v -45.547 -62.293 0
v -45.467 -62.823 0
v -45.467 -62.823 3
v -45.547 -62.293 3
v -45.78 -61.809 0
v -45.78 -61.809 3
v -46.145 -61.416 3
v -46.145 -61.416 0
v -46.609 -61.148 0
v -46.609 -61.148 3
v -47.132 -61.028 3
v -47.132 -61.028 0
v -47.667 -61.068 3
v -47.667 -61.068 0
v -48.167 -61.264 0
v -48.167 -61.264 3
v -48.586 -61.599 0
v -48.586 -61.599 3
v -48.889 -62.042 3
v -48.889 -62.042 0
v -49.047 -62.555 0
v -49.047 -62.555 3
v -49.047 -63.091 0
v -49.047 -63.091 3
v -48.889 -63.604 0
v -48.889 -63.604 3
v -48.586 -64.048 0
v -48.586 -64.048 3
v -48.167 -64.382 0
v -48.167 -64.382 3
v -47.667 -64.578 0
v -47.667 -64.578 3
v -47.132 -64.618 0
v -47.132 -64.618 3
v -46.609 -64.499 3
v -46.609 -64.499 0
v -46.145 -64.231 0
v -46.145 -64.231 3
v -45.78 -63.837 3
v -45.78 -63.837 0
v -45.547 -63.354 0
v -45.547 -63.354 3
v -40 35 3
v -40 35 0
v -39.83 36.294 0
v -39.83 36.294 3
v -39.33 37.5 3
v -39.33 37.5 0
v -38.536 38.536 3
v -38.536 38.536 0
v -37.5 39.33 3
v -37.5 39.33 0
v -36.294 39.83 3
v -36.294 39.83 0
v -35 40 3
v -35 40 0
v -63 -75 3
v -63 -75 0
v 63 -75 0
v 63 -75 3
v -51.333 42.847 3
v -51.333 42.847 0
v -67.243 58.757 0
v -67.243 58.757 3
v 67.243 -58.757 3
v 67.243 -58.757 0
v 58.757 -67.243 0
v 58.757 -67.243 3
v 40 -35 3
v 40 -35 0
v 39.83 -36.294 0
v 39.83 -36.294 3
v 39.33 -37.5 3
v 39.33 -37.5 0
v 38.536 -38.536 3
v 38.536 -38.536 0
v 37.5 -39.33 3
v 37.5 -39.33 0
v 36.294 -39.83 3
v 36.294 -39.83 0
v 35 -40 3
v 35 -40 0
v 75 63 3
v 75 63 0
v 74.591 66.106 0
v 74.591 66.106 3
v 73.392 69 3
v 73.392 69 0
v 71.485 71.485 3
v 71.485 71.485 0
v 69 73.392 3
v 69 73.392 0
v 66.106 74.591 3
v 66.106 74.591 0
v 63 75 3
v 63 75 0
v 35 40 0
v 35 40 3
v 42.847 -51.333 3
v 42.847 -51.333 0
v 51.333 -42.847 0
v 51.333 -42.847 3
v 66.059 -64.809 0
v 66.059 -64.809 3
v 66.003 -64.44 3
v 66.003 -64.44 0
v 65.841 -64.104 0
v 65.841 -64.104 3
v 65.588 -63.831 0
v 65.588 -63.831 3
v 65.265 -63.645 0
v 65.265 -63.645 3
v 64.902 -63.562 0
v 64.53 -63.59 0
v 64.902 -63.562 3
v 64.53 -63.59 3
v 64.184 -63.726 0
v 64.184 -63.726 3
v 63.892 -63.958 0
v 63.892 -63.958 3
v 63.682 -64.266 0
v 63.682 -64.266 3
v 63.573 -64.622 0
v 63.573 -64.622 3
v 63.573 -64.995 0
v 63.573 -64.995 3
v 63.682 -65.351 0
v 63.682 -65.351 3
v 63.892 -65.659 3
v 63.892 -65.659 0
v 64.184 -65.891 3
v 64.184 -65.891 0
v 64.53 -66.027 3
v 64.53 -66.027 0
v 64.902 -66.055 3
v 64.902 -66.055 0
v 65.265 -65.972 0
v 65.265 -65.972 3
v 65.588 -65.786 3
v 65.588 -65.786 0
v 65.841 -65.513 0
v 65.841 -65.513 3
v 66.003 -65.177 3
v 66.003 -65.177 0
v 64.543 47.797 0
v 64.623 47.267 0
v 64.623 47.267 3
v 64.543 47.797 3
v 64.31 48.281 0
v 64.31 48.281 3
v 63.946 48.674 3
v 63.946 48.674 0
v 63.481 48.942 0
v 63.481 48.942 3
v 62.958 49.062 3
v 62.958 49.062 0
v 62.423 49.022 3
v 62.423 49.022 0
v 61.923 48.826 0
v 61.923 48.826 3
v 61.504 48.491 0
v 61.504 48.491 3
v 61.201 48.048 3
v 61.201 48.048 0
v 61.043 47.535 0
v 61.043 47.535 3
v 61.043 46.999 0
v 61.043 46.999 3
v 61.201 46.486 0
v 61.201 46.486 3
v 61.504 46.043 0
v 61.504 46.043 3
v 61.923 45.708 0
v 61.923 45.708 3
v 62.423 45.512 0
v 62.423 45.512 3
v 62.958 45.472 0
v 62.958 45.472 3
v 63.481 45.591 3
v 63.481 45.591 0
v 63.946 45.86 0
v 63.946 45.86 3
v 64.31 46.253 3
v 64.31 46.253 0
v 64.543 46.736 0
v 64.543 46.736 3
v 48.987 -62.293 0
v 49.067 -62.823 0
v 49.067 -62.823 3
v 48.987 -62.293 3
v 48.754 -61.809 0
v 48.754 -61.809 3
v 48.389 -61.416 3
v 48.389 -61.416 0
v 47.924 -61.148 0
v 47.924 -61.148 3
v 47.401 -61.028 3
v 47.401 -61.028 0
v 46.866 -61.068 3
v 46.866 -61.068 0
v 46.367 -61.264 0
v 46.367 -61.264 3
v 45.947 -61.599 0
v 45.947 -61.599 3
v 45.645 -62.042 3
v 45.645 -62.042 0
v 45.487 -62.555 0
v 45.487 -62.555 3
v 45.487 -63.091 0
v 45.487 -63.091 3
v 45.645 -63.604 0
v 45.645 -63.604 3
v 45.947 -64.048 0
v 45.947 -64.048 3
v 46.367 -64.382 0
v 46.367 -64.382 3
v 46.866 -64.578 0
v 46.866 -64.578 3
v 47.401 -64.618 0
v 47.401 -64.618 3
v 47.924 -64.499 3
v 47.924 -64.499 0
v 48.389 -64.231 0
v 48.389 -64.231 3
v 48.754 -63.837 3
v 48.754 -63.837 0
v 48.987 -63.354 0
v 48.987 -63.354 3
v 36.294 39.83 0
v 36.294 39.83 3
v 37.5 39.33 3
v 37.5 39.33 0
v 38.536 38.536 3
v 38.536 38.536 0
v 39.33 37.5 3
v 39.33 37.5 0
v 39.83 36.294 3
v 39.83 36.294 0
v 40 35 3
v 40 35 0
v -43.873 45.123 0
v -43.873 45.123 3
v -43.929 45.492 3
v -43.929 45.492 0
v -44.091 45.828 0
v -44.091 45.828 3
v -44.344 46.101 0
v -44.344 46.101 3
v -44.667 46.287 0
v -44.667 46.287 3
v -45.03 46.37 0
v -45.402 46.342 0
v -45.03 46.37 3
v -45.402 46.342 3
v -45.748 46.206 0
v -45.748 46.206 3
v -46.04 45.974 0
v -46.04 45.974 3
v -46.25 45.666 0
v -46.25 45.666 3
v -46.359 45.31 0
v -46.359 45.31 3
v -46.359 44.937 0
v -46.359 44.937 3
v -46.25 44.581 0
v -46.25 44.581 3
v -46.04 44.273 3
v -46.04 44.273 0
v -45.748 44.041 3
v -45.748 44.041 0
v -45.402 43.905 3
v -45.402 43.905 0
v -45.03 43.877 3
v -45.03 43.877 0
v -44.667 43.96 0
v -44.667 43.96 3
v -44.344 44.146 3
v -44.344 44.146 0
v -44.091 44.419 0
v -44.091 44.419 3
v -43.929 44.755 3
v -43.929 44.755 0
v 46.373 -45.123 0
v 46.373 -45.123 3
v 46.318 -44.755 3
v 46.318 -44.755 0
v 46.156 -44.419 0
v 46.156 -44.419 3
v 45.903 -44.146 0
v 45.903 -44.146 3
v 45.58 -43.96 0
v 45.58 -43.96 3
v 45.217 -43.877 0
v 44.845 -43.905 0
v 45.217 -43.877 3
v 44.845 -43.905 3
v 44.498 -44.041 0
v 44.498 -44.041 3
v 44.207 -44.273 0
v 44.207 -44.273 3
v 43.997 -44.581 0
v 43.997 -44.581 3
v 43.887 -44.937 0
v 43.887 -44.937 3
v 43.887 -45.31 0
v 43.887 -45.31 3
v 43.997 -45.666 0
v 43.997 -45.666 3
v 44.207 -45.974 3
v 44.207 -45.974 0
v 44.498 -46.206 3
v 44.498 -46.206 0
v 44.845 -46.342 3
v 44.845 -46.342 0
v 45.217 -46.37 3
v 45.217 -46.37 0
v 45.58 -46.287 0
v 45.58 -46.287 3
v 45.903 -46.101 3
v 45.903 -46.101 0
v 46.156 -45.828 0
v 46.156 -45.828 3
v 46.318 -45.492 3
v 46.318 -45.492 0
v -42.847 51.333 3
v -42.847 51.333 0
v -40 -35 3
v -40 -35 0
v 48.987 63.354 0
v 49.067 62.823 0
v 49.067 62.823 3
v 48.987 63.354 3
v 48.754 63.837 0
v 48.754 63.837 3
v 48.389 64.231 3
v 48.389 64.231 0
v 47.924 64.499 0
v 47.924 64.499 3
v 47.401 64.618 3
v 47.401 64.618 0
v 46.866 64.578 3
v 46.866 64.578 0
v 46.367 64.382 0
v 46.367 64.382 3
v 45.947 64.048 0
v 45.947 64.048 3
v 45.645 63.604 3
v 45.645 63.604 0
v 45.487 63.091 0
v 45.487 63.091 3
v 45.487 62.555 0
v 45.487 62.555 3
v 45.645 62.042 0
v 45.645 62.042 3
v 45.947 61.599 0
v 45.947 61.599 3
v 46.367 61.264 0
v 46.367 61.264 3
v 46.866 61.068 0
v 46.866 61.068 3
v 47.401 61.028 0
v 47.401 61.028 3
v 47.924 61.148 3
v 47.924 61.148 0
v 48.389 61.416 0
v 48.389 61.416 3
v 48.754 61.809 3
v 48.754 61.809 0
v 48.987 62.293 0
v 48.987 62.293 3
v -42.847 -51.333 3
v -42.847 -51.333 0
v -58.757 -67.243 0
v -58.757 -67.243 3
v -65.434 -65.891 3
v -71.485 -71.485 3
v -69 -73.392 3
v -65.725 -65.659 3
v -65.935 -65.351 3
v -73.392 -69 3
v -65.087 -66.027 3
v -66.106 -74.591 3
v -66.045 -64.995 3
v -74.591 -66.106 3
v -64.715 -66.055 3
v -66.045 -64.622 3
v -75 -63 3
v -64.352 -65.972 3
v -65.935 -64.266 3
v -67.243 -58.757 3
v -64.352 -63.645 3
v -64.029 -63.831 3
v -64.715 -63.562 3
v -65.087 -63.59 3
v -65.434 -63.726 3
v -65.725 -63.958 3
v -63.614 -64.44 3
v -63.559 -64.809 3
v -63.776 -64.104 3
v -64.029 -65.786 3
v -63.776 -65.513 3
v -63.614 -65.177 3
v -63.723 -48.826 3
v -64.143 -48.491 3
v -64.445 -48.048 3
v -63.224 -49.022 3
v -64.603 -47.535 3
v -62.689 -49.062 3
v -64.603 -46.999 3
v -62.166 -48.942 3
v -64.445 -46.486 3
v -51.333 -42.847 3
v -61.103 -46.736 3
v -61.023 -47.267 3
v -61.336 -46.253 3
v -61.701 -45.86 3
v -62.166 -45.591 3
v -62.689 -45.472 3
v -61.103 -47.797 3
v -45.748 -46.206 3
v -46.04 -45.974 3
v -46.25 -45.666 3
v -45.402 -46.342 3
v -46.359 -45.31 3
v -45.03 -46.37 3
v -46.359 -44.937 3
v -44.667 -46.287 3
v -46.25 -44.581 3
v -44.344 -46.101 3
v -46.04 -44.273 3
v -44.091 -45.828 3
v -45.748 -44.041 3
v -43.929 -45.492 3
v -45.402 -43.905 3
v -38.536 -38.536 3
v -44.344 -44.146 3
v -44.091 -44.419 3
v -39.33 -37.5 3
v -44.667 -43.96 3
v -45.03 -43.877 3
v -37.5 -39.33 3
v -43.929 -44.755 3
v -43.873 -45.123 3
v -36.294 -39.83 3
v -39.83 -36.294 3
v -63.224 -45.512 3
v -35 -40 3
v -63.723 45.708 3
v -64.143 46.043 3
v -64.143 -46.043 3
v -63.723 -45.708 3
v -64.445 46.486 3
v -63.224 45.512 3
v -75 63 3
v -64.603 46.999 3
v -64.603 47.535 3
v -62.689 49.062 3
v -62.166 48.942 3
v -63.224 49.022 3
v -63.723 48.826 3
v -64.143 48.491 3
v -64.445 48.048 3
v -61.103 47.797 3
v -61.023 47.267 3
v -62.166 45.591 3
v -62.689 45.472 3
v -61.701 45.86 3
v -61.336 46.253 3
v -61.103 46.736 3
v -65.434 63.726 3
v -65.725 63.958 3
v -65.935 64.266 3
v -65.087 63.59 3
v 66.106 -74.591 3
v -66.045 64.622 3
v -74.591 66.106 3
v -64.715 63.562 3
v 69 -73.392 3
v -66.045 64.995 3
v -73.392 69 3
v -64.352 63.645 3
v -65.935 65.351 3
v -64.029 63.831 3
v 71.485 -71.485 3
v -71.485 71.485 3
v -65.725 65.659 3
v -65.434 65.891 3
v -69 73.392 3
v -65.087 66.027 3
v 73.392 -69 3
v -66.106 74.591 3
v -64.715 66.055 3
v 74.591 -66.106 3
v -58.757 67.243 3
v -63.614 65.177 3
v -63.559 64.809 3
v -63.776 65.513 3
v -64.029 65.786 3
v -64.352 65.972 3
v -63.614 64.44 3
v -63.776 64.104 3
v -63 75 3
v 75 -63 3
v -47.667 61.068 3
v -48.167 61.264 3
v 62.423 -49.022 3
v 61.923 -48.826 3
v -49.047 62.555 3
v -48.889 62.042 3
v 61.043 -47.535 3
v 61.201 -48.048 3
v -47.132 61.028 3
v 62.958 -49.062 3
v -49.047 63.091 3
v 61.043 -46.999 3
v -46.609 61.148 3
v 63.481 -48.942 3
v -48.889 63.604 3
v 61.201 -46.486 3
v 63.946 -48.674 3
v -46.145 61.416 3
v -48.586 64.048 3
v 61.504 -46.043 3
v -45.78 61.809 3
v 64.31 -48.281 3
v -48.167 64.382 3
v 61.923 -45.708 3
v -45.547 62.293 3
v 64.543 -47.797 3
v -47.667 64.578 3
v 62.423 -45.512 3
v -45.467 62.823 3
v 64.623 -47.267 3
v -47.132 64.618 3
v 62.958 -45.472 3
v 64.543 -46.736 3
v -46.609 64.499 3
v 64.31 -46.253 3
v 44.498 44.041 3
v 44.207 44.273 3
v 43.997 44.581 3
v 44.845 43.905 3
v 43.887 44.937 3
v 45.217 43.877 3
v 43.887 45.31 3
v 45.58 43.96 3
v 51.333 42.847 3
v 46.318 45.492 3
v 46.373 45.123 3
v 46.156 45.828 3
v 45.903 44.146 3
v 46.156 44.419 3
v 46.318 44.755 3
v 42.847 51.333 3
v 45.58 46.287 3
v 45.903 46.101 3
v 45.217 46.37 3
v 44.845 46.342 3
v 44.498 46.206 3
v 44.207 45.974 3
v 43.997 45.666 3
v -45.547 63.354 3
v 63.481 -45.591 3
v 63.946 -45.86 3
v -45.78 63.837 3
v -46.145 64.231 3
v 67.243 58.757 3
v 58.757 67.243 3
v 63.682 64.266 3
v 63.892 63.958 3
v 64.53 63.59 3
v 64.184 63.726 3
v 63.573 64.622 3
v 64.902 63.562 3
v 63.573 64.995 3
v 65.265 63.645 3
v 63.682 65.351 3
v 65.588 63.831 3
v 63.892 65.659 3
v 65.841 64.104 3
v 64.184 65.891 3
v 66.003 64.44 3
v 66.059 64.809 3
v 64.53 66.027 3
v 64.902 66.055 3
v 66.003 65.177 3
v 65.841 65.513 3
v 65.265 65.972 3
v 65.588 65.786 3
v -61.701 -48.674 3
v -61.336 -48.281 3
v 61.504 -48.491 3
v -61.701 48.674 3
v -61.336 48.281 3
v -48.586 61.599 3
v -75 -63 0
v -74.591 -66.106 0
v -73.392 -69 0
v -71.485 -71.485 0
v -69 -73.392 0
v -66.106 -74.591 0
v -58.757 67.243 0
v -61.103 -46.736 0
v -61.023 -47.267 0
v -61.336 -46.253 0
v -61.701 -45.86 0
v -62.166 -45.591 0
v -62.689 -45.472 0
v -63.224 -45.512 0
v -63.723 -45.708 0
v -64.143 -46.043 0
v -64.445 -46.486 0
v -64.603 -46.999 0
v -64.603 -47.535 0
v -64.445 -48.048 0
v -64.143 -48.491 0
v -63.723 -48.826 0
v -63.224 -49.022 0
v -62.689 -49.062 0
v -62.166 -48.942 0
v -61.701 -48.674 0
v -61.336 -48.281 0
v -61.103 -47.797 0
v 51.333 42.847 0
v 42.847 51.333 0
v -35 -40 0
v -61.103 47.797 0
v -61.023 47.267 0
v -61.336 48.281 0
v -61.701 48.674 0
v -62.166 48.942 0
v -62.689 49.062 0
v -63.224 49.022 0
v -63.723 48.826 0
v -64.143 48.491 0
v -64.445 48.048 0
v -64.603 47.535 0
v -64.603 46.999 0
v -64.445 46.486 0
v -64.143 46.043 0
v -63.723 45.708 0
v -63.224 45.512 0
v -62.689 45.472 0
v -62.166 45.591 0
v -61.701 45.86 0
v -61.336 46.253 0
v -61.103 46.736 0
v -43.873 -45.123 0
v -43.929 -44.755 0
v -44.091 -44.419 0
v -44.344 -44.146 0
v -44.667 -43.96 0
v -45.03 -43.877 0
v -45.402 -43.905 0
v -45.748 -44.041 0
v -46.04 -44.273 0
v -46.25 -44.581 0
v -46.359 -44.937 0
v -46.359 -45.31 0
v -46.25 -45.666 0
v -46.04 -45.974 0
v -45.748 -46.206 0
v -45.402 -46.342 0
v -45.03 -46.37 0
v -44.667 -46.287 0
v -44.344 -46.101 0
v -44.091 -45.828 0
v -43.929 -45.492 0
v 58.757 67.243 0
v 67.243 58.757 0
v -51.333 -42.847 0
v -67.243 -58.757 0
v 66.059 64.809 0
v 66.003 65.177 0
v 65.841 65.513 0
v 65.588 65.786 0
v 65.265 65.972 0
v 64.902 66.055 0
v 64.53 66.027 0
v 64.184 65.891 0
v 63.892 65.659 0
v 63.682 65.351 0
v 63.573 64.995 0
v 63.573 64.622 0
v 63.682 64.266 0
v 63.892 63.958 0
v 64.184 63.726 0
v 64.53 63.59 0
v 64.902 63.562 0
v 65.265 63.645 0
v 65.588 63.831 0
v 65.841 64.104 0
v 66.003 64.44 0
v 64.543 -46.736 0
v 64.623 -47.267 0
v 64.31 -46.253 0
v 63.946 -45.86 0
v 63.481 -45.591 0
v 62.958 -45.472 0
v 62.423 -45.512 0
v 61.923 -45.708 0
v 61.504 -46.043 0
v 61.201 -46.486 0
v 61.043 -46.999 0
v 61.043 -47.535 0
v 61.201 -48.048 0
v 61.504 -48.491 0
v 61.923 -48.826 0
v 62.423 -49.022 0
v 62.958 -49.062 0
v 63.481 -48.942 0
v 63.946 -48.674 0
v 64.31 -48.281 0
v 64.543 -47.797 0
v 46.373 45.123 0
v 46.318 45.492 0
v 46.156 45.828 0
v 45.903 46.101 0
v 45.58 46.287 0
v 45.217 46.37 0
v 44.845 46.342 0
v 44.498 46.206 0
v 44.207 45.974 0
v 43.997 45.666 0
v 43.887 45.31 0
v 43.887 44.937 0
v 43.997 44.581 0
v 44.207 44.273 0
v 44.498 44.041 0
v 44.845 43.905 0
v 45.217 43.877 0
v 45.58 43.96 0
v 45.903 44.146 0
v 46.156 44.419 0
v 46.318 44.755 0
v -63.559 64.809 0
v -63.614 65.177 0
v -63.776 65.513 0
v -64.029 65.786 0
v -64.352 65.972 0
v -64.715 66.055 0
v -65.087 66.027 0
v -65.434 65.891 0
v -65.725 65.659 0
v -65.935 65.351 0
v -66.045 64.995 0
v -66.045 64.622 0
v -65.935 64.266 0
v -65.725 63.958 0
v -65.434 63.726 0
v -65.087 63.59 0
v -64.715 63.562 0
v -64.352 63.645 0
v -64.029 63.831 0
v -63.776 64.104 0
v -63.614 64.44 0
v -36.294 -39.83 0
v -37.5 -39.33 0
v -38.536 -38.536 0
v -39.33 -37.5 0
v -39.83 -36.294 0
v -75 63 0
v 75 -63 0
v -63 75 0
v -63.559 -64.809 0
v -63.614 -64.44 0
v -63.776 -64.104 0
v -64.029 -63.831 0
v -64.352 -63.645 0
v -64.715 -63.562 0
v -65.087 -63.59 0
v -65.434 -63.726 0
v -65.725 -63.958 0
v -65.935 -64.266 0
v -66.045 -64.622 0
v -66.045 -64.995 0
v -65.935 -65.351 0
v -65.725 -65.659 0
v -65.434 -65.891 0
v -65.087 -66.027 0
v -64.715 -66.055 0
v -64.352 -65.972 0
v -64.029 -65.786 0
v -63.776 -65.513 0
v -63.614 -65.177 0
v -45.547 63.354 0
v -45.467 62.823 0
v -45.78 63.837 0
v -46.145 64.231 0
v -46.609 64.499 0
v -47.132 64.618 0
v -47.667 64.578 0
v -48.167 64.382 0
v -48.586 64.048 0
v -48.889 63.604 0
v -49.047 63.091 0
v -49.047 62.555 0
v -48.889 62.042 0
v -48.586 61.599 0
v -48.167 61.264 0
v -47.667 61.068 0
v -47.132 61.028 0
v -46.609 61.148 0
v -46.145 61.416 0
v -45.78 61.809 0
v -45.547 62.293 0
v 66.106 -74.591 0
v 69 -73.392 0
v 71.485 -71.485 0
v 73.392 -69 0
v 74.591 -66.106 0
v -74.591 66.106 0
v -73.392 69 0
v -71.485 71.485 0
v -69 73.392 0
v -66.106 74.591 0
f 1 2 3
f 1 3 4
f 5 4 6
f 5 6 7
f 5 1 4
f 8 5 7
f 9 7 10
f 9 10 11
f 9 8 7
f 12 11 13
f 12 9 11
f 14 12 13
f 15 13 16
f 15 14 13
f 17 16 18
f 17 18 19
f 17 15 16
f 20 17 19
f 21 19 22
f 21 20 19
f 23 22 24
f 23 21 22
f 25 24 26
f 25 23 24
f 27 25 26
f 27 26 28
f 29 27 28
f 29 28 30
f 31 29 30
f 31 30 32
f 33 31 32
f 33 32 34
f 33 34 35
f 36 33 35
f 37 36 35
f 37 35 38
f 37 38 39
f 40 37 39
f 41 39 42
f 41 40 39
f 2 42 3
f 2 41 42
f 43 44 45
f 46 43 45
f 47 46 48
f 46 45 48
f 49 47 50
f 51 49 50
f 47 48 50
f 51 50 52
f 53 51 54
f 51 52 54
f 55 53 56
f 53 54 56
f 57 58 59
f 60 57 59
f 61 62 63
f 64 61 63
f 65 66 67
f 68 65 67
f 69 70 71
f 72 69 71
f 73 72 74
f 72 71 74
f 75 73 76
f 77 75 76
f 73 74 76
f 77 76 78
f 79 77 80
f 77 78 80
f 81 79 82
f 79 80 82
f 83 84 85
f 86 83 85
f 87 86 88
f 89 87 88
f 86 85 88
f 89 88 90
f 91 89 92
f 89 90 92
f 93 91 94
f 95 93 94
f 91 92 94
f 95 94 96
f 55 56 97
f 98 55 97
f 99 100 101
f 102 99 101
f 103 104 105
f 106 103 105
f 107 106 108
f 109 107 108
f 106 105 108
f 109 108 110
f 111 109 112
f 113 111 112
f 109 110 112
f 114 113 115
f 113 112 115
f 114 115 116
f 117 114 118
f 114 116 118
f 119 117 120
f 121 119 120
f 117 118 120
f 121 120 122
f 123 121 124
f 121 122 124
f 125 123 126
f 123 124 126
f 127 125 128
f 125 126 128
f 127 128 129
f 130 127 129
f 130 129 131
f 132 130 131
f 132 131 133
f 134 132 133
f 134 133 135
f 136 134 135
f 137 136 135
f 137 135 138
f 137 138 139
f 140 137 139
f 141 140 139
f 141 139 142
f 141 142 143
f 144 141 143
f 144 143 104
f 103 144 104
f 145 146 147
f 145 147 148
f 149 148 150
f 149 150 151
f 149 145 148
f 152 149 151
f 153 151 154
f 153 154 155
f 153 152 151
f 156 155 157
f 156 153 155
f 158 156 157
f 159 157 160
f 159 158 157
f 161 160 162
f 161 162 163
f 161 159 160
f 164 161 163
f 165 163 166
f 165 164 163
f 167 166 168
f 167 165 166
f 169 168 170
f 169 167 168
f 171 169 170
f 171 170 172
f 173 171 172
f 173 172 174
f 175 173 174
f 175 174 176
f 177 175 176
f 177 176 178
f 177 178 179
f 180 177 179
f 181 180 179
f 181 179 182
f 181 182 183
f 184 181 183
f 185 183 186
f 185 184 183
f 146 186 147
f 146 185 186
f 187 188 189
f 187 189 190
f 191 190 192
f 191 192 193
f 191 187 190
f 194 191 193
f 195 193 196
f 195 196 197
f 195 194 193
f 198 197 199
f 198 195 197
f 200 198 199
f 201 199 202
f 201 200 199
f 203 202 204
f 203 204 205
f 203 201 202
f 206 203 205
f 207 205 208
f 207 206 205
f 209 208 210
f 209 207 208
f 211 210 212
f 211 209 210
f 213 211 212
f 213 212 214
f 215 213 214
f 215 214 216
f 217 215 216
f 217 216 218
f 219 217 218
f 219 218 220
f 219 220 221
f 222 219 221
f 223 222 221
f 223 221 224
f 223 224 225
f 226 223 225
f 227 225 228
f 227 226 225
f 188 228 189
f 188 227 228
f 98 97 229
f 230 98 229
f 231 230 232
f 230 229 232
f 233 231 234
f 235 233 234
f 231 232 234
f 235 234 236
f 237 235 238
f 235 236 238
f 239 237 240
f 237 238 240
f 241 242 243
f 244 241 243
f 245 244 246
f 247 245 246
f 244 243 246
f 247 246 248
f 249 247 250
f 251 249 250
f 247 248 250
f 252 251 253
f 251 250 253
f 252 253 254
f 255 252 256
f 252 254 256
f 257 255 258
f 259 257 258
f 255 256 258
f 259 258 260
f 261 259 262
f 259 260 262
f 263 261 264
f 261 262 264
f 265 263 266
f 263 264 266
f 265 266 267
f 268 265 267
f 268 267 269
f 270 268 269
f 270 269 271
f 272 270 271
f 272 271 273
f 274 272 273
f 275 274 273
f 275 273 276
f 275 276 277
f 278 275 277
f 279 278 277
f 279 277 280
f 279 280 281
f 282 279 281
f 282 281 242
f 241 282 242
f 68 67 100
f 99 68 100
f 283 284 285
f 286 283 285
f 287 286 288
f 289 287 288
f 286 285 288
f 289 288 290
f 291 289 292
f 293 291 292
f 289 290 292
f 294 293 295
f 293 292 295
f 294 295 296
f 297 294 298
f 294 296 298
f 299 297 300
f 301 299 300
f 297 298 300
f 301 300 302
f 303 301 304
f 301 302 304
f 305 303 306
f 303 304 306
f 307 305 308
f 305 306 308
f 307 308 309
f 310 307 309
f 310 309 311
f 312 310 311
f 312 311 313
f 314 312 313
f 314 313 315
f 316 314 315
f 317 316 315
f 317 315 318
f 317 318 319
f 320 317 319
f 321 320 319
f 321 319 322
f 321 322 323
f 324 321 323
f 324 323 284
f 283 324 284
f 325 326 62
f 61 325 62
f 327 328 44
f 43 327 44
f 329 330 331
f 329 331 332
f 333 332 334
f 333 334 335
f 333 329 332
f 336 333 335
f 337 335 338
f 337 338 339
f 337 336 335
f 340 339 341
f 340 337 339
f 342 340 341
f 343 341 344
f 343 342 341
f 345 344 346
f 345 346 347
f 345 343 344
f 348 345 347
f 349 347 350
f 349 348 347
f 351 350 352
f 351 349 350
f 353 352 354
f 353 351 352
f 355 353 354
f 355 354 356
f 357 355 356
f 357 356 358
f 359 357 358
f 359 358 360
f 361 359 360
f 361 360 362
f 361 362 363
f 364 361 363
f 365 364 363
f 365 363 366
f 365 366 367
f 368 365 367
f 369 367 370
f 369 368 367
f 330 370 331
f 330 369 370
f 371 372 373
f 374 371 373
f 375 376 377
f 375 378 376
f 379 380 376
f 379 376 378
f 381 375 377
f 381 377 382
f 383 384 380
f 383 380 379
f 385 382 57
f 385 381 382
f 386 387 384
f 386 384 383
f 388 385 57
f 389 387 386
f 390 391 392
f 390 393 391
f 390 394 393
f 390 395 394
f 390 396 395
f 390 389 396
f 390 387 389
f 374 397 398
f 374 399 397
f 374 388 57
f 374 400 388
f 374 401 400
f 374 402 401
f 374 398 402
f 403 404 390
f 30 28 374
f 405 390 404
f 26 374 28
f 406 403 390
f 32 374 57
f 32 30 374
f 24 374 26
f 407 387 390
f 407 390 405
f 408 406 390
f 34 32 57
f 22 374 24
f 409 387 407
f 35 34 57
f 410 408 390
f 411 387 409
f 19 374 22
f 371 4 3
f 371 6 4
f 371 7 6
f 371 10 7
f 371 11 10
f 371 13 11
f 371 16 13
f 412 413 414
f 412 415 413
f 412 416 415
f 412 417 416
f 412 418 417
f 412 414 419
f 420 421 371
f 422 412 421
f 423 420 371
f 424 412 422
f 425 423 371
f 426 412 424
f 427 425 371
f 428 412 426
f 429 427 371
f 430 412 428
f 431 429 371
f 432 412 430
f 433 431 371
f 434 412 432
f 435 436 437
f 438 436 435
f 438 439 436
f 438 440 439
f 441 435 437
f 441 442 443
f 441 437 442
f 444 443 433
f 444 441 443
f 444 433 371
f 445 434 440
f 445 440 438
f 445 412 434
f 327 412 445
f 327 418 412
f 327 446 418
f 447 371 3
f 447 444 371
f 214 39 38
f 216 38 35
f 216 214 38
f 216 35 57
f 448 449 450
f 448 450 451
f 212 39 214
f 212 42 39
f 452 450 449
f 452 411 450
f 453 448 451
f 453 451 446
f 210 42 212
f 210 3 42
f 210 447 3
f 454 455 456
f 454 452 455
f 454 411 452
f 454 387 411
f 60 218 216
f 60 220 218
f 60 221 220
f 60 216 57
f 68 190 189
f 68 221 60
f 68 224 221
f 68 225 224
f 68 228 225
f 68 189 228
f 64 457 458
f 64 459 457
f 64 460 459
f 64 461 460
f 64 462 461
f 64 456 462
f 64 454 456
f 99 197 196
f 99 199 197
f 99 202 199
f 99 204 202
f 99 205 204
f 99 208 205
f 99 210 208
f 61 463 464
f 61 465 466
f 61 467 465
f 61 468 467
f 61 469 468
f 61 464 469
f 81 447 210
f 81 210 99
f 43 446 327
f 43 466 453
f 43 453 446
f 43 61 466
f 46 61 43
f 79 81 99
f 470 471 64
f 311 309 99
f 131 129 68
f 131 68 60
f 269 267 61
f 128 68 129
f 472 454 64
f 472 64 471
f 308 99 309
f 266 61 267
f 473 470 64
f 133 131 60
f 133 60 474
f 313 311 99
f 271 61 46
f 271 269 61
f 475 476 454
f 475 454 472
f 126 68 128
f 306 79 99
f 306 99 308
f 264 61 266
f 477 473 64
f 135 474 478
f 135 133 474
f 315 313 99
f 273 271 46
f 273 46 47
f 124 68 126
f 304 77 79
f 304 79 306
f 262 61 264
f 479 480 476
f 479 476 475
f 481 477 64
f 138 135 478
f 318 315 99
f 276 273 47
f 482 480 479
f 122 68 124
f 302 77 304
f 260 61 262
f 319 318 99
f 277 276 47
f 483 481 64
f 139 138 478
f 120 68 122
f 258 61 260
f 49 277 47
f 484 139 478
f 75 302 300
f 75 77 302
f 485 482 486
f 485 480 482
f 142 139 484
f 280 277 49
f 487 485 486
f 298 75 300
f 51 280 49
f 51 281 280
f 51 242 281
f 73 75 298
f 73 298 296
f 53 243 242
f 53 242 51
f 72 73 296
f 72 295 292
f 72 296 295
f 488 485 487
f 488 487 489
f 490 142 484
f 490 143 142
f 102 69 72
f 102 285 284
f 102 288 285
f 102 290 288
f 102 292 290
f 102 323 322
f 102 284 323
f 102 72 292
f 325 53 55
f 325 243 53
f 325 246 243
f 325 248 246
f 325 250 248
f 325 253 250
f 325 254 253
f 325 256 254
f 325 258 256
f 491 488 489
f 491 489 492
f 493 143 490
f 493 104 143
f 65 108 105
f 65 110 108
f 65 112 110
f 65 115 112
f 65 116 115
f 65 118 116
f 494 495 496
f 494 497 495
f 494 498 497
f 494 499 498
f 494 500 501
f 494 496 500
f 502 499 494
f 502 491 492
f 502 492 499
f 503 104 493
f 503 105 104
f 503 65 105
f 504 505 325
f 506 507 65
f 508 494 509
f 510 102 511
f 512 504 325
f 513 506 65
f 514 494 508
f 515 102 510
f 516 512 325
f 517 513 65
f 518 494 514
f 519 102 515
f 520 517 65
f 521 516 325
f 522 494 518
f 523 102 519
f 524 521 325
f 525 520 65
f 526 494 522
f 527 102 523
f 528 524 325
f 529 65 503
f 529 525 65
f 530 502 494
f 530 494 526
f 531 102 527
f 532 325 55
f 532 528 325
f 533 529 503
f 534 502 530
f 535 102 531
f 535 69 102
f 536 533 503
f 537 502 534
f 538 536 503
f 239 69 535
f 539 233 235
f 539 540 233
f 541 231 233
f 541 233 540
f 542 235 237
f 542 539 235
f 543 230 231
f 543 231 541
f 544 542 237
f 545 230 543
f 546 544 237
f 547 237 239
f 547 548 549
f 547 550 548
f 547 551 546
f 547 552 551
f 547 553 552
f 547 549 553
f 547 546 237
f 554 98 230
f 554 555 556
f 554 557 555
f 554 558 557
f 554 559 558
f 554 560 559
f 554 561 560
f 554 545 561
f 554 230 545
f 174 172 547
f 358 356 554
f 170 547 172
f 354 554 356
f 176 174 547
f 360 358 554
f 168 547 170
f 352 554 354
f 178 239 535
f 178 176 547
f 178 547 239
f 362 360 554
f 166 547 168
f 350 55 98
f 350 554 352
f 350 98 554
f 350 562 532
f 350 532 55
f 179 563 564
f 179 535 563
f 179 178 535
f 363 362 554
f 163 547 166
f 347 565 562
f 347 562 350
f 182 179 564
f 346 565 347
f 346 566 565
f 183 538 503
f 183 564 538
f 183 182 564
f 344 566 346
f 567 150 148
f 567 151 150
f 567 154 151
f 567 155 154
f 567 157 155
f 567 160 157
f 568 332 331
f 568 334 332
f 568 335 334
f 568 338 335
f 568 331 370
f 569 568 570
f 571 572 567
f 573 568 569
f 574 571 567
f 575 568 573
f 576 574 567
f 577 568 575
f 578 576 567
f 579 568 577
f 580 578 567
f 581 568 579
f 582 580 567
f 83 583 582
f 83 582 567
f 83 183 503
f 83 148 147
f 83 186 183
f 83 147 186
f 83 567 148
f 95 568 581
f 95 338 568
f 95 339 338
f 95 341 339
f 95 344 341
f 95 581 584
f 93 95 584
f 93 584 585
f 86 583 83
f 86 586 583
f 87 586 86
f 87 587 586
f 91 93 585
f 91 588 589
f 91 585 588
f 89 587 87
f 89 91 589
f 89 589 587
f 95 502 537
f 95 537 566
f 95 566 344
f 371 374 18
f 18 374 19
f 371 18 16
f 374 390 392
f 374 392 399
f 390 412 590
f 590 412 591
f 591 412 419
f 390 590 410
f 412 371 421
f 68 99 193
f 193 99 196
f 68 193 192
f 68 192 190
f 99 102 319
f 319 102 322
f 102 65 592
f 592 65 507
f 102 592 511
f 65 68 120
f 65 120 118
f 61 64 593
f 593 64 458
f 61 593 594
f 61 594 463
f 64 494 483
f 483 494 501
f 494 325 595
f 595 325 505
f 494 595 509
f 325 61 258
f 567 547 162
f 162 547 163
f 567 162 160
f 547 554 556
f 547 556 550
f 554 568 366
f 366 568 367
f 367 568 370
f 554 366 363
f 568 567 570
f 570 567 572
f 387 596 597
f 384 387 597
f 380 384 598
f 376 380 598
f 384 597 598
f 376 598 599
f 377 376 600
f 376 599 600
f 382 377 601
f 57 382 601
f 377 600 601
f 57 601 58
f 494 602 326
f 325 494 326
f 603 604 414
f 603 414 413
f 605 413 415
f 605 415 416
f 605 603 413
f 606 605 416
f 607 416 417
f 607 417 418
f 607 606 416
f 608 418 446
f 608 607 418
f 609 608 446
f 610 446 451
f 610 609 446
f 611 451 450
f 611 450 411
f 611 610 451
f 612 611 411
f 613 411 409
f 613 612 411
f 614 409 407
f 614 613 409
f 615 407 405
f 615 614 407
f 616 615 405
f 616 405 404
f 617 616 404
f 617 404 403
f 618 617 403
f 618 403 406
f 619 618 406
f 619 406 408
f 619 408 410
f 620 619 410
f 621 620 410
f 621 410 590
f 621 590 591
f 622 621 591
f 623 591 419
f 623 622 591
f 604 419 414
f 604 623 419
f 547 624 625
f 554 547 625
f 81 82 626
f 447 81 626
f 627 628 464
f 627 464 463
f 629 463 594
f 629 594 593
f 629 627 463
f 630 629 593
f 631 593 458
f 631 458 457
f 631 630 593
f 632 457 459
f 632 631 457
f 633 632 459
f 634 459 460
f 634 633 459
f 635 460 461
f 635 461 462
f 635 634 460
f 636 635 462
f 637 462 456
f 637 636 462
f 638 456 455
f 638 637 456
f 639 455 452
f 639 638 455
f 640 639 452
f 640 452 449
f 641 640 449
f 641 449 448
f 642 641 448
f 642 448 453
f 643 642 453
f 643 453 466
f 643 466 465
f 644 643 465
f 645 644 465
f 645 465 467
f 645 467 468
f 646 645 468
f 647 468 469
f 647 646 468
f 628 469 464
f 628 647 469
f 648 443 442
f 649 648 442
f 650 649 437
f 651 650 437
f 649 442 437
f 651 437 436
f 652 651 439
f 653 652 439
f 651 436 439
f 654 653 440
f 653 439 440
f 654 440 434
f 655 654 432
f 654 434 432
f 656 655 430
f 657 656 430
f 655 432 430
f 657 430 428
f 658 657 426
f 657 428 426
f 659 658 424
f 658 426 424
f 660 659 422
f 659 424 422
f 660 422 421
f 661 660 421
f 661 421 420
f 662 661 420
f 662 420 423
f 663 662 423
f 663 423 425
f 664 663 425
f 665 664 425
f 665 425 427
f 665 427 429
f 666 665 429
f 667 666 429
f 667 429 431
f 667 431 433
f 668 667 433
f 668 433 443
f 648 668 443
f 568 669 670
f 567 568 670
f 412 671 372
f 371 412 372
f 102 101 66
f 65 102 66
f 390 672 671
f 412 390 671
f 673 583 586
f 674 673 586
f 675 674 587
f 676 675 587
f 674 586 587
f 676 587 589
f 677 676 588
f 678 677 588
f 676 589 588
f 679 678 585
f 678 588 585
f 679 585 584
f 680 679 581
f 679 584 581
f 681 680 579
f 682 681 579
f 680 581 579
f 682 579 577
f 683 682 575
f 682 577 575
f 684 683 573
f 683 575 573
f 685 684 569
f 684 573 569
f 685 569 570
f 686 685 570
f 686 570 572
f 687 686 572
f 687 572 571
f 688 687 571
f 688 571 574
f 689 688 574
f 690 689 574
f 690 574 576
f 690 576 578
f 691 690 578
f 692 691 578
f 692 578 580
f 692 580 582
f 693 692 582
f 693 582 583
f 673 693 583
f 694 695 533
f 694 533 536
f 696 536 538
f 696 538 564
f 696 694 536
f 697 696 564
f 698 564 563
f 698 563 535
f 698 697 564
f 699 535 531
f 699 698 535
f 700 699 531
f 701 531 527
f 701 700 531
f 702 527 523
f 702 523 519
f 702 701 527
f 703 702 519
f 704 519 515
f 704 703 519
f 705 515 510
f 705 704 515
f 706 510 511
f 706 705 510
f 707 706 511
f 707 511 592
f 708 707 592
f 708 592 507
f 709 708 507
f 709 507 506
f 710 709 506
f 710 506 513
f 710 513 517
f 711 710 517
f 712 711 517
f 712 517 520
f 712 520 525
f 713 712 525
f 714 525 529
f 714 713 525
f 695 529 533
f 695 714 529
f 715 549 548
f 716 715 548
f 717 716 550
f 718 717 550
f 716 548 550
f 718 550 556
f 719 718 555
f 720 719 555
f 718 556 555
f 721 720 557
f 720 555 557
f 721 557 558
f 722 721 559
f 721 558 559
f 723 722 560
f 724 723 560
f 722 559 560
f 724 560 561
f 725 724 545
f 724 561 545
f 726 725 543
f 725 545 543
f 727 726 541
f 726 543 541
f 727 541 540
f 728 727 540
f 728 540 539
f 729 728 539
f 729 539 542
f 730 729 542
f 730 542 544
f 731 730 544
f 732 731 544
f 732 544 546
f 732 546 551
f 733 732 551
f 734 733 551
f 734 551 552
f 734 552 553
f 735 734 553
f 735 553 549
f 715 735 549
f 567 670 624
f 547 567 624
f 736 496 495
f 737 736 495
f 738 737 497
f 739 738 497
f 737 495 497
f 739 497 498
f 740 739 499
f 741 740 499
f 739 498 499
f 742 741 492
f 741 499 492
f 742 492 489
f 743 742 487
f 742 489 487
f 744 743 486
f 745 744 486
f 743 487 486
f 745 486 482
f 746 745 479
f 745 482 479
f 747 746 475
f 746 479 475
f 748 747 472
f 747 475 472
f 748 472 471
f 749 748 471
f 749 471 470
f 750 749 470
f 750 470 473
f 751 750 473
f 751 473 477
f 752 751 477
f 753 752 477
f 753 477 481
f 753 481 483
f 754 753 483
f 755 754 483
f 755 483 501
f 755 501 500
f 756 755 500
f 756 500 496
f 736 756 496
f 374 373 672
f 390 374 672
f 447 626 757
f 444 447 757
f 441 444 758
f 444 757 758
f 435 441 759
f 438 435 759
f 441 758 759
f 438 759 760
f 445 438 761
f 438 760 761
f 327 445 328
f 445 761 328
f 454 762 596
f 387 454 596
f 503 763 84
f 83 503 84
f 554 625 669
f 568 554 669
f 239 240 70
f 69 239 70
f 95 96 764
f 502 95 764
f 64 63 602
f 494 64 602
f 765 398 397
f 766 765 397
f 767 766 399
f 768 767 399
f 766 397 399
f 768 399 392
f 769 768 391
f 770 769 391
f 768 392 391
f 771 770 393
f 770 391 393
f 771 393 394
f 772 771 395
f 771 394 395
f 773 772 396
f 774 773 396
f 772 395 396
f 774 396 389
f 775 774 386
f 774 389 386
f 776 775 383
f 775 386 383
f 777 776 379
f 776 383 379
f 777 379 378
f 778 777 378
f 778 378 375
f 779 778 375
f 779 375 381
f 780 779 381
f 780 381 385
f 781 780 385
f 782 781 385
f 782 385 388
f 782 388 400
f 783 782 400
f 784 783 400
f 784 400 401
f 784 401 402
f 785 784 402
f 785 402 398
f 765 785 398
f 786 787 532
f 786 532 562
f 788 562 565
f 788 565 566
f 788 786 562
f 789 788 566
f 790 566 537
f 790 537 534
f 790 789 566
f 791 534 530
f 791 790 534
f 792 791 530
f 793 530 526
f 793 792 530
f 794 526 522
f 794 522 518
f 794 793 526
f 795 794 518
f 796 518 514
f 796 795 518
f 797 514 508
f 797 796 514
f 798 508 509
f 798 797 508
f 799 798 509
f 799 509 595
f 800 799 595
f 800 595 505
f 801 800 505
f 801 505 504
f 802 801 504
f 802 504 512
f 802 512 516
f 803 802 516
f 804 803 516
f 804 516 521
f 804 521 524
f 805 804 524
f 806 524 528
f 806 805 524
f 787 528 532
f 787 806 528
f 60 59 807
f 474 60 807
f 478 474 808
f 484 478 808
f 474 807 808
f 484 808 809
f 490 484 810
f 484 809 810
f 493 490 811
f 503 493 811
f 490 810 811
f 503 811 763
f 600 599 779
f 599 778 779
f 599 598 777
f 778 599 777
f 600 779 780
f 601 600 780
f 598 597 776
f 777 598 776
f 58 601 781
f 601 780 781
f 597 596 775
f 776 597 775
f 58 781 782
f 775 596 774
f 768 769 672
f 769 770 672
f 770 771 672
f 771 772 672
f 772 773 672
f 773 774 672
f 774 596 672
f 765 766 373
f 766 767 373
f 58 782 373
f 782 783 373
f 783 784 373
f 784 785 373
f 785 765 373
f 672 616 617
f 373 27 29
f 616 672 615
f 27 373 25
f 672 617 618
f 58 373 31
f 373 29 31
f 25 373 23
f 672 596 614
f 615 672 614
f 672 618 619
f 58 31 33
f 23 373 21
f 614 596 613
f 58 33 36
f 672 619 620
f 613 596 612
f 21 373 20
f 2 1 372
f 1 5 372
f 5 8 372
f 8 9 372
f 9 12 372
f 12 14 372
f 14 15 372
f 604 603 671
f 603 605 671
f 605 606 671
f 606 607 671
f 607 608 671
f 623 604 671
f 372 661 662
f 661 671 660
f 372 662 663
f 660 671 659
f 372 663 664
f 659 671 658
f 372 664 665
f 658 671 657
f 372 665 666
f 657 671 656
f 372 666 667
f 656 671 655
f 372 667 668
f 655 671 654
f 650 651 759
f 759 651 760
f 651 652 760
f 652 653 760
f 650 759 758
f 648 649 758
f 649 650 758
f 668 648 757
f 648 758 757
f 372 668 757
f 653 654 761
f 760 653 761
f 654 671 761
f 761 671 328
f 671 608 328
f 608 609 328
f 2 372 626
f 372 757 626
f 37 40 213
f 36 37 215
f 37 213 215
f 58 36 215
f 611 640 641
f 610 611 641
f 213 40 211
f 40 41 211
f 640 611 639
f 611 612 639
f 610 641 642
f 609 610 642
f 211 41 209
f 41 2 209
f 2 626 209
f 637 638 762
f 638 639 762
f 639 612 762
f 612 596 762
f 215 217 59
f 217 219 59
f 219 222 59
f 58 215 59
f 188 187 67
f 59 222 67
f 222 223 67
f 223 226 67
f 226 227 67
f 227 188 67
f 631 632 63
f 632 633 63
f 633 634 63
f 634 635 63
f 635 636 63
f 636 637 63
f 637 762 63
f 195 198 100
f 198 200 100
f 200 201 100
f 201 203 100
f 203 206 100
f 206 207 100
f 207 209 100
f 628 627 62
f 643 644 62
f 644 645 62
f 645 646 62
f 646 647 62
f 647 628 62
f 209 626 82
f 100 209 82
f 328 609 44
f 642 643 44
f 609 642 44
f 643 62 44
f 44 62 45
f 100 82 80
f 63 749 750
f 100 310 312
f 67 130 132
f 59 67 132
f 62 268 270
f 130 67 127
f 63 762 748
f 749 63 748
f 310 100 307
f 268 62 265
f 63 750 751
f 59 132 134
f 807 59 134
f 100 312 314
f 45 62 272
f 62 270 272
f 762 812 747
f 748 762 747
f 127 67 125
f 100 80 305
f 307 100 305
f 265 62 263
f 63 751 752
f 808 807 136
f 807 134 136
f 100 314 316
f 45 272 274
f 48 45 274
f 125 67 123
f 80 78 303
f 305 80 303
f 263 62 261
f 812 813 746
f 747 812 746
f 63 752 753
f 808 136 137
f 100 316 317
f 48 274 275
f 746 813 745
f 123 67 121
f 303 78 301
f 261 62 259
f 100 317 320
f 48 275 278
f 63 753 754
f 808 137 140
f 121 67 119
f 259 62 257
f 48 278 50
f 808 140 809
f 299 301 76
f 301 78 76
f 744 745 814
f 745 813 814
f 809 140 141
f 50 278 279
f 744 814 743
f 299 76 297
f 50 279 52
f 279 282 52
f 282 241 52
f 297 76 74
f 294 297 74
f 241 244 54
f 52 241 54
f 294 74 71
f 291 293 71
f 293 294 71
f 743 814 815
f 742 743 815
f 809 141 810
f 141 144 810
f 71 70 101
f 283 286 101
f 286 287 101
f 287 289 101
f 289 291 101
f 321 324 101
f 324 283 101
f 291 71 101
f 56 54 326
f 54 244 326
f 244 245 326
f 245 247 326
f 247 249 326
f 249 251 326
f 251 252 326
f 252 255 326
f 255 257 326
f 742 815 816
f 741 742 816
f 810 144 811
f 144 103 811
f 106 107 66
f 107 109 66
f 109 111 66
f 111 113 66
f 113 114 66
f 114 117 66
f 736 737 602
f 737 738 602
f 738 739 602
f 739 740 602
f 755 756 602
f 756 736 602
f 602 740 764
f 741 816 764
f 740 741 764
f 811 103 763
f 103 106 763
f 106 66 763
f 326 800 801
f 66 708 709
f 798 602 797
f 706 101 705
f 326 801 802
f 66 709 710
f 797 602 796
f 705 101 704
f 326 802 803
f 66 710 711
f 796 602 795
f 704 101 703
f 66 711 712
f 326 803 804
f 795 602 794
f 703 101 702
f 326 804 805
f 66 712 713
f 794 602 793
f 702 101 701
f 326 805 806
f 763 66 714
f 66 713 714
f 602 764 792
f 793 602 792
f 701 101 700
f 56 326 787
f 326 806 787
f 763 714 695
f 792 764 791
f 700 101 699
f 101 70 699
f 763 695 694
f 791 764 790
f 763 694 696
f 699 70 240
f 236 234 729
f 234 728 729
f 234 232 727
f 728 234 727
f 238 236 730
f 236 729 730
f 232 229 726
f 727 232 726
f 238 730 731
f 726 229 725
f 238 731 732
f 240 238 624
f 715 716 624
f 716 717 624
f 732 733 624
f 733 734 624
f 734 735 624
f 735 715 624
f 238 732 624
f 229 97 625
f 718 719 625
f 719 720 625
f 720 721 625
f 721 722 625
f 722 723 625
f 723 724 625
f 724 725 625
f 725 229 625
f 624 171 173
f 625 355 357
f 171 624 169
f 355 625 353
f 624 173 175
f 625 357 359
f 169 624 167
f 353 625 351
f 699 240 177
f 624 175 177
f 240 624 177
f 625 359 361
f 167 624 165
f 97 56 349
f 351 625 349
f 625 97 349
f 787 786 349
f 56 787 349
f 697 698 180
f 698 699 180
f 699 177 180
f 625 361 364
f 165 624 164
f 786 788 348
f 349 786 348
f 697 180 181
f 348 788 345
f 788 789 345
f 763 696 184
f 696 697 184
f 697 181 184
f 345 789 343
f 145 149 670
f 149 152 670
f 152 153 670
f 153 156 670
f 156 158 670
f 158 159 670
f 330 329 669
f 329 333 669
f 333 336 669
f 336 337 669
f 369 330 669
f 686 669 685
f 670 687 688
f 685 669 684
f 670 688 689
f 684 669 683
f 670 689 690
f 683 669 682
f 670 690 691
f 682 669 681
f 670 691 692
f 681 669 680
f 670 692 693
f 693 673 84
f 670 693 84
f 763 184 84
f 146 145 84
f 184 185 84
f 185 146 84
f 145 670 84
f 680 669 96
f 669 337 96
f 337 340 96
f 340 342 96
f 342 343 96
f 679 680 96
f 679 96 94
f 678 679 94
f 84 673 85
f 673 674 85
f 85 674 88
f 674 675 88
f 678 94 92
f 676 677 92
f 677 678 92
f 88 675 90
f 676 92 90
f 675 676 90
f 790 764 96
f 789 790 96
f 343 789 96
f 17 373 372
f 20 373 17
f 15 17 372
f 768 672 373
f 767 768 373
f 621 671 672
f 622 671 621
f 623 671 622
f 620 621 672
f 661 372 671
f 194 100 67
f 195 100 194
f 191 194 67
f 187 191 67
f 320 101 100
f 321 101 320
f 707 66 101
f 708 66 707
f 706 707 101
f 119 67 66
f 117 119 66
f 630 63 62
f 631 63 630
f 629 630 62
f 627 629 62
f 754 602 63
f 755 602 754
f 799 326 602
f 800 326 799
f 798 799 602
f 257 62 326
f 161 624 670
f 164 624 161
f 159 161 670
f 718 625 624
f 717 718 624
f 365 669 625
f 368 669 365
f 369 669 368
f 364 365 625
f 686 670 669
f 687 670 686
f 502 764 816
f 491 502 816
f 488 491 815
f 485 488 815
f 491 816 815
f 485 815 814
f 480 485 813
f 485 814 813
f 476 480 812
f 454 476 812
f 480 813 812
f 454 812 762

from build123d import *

# Parameters (mm, degrees)
F0_R     = 1.8
F1_DEPTH = 3
F2_R     = 1.25
F3_DEPTH = 3.001


with BuildPart() as f1:
    # F0 (on Top) → F1 (new body)
    with BuildSketch(Plane.XY):
        with BuildLine():
            Line((63, 75), (-63, 75))
            ThreePointArc((-63, 75), (-71.485281, 71.485281), (-75, 63))
            Line((-75, 63), (-75, -63))
            ThreePointArc((-75, -63), (-71.485281, -71.485281), (-63, -75))
            Line((-63, -75), (63, -75))
            ThreePointArc((63, -75), (71.485281, -71.485281), (75, -63))
            Line((75, -63), (75, 63))
            ThreePointArc((75, 63), (71.485281, 71.485281), (63, 75))
        make_face()
        with Locations((-47.266874, -62.823223)):
            Circle(F0_R, mode=Mode.SUBTRACT)
        with Locations((-62.823223, -47.266874)):
            Circle(F0_R, mode=Mode.SUBTRACT)
        Polygon((-58.757359, -67.242641), (-67.242641, -58.757359), (-51.332738, -42.847457), (-42.847457, -51.332738), align=None, mode=Mode.SUBTRACT)
        with Locations((47.266874, -62.823223)):
            Circle(F0_R, mode=Mode.SUBTRACT)
        Polygon((42.847457, -51.332738), (51.332738, -42.847457), (67.242641, -58.757359), (58.757359, -67.242641), align=None, mode=Mode.SUBTRACT)
        with Locations((62.823223, -47.266874)):
            Circle(F0_R, mode=Mode.SUBTRACT)
        with Locations((-62.823223, 47.266874)):
            Circle(F0_R, mode=Mode.SUBTRACT)
        Polygon((-67.242641, 58.757359), (-58.757359, 67.242641), (-42.847457, 51.332738), (-51.332738, 42.847457), align=None, mode=Mode.SUBTRACT)
        with Locations((-47.266874, 62.823223)):
            Circle(F0_R, mode=Mode.SUBTRACT)
        with BuildLine():
            Line((-40, -35), (-40, 0))
            Line((-40, 0), (-40, 35))
            ThreePointArc((-40, 35), (-38.535534, 38.535534), (-35, 40))
            Line((-35, 40), (0, 40))
            Line((0, 40), (35, 40))
            ThreePointArc((35, 40), (38.535534, 38.535534), (40, 35))
            Line((40, 35), (40, 0))
            Line((40, 0), (40, -35))
            ThreePointArc((40, -35), (38.535534, -38.535534), (35, -40))
            Line((35, -40), (0, -40))
            Line((0, -40), (-35, -40))
            ThreePointArc((-35, -40), (-38.535534, -38.535534), (-40, -35))
        make_face(mode=Mode.SUBTRACT)
        Polygon((51.332738, 42.847457), (42.847457, 51.332738), (58.757359, 67.242641), (67.242641, 58.757359), align=None, mode=Mode.SUBTRACT)
        with Locations((62.823223, 47.266874)):
            Circle(F0_R, mode=Mode.SUBTRACT)
        with Locations((47.266874, 62.823223)):
            Circle(F0_R, mode=Mode.SUBTRACT)
    extrude(amount=F1_DEPTH)

    # F2 (on face) → F3 (cut, through all)
    with BuildSketch(Plane.XY.offset(3)):
        with Locations((-64.80856, -64.80856)):
            Circle(F2_R)
        with Locations((-45.123414, -45.123414)):
            Circle(F2_R)
        with Locations((45.123414, -45.123414)):
            Circle(F2_R)
        with Locations((45.123414, 45.123414)):
            Circle(F2_R)
        with Locations((-45.123414, 45.123414)):
            Circle(F2_R)
        with Locations((64.80856, -64.80856)):
            Circle(F2_R)
        with Locations((64.80856, 64.80856)):
            Circle(F2_R)
        with Locations((-64.80856, 64.80856)):
            Circle(F2_R)
    extrude(amount=-F3_DEPTH, mode=Mode.SUBTRACT)


with BuildPart() as f4_1:
    # F4: copy of F1
    add(f1.part.moved(Location((0, 0, 20))))


solid = f1.part
